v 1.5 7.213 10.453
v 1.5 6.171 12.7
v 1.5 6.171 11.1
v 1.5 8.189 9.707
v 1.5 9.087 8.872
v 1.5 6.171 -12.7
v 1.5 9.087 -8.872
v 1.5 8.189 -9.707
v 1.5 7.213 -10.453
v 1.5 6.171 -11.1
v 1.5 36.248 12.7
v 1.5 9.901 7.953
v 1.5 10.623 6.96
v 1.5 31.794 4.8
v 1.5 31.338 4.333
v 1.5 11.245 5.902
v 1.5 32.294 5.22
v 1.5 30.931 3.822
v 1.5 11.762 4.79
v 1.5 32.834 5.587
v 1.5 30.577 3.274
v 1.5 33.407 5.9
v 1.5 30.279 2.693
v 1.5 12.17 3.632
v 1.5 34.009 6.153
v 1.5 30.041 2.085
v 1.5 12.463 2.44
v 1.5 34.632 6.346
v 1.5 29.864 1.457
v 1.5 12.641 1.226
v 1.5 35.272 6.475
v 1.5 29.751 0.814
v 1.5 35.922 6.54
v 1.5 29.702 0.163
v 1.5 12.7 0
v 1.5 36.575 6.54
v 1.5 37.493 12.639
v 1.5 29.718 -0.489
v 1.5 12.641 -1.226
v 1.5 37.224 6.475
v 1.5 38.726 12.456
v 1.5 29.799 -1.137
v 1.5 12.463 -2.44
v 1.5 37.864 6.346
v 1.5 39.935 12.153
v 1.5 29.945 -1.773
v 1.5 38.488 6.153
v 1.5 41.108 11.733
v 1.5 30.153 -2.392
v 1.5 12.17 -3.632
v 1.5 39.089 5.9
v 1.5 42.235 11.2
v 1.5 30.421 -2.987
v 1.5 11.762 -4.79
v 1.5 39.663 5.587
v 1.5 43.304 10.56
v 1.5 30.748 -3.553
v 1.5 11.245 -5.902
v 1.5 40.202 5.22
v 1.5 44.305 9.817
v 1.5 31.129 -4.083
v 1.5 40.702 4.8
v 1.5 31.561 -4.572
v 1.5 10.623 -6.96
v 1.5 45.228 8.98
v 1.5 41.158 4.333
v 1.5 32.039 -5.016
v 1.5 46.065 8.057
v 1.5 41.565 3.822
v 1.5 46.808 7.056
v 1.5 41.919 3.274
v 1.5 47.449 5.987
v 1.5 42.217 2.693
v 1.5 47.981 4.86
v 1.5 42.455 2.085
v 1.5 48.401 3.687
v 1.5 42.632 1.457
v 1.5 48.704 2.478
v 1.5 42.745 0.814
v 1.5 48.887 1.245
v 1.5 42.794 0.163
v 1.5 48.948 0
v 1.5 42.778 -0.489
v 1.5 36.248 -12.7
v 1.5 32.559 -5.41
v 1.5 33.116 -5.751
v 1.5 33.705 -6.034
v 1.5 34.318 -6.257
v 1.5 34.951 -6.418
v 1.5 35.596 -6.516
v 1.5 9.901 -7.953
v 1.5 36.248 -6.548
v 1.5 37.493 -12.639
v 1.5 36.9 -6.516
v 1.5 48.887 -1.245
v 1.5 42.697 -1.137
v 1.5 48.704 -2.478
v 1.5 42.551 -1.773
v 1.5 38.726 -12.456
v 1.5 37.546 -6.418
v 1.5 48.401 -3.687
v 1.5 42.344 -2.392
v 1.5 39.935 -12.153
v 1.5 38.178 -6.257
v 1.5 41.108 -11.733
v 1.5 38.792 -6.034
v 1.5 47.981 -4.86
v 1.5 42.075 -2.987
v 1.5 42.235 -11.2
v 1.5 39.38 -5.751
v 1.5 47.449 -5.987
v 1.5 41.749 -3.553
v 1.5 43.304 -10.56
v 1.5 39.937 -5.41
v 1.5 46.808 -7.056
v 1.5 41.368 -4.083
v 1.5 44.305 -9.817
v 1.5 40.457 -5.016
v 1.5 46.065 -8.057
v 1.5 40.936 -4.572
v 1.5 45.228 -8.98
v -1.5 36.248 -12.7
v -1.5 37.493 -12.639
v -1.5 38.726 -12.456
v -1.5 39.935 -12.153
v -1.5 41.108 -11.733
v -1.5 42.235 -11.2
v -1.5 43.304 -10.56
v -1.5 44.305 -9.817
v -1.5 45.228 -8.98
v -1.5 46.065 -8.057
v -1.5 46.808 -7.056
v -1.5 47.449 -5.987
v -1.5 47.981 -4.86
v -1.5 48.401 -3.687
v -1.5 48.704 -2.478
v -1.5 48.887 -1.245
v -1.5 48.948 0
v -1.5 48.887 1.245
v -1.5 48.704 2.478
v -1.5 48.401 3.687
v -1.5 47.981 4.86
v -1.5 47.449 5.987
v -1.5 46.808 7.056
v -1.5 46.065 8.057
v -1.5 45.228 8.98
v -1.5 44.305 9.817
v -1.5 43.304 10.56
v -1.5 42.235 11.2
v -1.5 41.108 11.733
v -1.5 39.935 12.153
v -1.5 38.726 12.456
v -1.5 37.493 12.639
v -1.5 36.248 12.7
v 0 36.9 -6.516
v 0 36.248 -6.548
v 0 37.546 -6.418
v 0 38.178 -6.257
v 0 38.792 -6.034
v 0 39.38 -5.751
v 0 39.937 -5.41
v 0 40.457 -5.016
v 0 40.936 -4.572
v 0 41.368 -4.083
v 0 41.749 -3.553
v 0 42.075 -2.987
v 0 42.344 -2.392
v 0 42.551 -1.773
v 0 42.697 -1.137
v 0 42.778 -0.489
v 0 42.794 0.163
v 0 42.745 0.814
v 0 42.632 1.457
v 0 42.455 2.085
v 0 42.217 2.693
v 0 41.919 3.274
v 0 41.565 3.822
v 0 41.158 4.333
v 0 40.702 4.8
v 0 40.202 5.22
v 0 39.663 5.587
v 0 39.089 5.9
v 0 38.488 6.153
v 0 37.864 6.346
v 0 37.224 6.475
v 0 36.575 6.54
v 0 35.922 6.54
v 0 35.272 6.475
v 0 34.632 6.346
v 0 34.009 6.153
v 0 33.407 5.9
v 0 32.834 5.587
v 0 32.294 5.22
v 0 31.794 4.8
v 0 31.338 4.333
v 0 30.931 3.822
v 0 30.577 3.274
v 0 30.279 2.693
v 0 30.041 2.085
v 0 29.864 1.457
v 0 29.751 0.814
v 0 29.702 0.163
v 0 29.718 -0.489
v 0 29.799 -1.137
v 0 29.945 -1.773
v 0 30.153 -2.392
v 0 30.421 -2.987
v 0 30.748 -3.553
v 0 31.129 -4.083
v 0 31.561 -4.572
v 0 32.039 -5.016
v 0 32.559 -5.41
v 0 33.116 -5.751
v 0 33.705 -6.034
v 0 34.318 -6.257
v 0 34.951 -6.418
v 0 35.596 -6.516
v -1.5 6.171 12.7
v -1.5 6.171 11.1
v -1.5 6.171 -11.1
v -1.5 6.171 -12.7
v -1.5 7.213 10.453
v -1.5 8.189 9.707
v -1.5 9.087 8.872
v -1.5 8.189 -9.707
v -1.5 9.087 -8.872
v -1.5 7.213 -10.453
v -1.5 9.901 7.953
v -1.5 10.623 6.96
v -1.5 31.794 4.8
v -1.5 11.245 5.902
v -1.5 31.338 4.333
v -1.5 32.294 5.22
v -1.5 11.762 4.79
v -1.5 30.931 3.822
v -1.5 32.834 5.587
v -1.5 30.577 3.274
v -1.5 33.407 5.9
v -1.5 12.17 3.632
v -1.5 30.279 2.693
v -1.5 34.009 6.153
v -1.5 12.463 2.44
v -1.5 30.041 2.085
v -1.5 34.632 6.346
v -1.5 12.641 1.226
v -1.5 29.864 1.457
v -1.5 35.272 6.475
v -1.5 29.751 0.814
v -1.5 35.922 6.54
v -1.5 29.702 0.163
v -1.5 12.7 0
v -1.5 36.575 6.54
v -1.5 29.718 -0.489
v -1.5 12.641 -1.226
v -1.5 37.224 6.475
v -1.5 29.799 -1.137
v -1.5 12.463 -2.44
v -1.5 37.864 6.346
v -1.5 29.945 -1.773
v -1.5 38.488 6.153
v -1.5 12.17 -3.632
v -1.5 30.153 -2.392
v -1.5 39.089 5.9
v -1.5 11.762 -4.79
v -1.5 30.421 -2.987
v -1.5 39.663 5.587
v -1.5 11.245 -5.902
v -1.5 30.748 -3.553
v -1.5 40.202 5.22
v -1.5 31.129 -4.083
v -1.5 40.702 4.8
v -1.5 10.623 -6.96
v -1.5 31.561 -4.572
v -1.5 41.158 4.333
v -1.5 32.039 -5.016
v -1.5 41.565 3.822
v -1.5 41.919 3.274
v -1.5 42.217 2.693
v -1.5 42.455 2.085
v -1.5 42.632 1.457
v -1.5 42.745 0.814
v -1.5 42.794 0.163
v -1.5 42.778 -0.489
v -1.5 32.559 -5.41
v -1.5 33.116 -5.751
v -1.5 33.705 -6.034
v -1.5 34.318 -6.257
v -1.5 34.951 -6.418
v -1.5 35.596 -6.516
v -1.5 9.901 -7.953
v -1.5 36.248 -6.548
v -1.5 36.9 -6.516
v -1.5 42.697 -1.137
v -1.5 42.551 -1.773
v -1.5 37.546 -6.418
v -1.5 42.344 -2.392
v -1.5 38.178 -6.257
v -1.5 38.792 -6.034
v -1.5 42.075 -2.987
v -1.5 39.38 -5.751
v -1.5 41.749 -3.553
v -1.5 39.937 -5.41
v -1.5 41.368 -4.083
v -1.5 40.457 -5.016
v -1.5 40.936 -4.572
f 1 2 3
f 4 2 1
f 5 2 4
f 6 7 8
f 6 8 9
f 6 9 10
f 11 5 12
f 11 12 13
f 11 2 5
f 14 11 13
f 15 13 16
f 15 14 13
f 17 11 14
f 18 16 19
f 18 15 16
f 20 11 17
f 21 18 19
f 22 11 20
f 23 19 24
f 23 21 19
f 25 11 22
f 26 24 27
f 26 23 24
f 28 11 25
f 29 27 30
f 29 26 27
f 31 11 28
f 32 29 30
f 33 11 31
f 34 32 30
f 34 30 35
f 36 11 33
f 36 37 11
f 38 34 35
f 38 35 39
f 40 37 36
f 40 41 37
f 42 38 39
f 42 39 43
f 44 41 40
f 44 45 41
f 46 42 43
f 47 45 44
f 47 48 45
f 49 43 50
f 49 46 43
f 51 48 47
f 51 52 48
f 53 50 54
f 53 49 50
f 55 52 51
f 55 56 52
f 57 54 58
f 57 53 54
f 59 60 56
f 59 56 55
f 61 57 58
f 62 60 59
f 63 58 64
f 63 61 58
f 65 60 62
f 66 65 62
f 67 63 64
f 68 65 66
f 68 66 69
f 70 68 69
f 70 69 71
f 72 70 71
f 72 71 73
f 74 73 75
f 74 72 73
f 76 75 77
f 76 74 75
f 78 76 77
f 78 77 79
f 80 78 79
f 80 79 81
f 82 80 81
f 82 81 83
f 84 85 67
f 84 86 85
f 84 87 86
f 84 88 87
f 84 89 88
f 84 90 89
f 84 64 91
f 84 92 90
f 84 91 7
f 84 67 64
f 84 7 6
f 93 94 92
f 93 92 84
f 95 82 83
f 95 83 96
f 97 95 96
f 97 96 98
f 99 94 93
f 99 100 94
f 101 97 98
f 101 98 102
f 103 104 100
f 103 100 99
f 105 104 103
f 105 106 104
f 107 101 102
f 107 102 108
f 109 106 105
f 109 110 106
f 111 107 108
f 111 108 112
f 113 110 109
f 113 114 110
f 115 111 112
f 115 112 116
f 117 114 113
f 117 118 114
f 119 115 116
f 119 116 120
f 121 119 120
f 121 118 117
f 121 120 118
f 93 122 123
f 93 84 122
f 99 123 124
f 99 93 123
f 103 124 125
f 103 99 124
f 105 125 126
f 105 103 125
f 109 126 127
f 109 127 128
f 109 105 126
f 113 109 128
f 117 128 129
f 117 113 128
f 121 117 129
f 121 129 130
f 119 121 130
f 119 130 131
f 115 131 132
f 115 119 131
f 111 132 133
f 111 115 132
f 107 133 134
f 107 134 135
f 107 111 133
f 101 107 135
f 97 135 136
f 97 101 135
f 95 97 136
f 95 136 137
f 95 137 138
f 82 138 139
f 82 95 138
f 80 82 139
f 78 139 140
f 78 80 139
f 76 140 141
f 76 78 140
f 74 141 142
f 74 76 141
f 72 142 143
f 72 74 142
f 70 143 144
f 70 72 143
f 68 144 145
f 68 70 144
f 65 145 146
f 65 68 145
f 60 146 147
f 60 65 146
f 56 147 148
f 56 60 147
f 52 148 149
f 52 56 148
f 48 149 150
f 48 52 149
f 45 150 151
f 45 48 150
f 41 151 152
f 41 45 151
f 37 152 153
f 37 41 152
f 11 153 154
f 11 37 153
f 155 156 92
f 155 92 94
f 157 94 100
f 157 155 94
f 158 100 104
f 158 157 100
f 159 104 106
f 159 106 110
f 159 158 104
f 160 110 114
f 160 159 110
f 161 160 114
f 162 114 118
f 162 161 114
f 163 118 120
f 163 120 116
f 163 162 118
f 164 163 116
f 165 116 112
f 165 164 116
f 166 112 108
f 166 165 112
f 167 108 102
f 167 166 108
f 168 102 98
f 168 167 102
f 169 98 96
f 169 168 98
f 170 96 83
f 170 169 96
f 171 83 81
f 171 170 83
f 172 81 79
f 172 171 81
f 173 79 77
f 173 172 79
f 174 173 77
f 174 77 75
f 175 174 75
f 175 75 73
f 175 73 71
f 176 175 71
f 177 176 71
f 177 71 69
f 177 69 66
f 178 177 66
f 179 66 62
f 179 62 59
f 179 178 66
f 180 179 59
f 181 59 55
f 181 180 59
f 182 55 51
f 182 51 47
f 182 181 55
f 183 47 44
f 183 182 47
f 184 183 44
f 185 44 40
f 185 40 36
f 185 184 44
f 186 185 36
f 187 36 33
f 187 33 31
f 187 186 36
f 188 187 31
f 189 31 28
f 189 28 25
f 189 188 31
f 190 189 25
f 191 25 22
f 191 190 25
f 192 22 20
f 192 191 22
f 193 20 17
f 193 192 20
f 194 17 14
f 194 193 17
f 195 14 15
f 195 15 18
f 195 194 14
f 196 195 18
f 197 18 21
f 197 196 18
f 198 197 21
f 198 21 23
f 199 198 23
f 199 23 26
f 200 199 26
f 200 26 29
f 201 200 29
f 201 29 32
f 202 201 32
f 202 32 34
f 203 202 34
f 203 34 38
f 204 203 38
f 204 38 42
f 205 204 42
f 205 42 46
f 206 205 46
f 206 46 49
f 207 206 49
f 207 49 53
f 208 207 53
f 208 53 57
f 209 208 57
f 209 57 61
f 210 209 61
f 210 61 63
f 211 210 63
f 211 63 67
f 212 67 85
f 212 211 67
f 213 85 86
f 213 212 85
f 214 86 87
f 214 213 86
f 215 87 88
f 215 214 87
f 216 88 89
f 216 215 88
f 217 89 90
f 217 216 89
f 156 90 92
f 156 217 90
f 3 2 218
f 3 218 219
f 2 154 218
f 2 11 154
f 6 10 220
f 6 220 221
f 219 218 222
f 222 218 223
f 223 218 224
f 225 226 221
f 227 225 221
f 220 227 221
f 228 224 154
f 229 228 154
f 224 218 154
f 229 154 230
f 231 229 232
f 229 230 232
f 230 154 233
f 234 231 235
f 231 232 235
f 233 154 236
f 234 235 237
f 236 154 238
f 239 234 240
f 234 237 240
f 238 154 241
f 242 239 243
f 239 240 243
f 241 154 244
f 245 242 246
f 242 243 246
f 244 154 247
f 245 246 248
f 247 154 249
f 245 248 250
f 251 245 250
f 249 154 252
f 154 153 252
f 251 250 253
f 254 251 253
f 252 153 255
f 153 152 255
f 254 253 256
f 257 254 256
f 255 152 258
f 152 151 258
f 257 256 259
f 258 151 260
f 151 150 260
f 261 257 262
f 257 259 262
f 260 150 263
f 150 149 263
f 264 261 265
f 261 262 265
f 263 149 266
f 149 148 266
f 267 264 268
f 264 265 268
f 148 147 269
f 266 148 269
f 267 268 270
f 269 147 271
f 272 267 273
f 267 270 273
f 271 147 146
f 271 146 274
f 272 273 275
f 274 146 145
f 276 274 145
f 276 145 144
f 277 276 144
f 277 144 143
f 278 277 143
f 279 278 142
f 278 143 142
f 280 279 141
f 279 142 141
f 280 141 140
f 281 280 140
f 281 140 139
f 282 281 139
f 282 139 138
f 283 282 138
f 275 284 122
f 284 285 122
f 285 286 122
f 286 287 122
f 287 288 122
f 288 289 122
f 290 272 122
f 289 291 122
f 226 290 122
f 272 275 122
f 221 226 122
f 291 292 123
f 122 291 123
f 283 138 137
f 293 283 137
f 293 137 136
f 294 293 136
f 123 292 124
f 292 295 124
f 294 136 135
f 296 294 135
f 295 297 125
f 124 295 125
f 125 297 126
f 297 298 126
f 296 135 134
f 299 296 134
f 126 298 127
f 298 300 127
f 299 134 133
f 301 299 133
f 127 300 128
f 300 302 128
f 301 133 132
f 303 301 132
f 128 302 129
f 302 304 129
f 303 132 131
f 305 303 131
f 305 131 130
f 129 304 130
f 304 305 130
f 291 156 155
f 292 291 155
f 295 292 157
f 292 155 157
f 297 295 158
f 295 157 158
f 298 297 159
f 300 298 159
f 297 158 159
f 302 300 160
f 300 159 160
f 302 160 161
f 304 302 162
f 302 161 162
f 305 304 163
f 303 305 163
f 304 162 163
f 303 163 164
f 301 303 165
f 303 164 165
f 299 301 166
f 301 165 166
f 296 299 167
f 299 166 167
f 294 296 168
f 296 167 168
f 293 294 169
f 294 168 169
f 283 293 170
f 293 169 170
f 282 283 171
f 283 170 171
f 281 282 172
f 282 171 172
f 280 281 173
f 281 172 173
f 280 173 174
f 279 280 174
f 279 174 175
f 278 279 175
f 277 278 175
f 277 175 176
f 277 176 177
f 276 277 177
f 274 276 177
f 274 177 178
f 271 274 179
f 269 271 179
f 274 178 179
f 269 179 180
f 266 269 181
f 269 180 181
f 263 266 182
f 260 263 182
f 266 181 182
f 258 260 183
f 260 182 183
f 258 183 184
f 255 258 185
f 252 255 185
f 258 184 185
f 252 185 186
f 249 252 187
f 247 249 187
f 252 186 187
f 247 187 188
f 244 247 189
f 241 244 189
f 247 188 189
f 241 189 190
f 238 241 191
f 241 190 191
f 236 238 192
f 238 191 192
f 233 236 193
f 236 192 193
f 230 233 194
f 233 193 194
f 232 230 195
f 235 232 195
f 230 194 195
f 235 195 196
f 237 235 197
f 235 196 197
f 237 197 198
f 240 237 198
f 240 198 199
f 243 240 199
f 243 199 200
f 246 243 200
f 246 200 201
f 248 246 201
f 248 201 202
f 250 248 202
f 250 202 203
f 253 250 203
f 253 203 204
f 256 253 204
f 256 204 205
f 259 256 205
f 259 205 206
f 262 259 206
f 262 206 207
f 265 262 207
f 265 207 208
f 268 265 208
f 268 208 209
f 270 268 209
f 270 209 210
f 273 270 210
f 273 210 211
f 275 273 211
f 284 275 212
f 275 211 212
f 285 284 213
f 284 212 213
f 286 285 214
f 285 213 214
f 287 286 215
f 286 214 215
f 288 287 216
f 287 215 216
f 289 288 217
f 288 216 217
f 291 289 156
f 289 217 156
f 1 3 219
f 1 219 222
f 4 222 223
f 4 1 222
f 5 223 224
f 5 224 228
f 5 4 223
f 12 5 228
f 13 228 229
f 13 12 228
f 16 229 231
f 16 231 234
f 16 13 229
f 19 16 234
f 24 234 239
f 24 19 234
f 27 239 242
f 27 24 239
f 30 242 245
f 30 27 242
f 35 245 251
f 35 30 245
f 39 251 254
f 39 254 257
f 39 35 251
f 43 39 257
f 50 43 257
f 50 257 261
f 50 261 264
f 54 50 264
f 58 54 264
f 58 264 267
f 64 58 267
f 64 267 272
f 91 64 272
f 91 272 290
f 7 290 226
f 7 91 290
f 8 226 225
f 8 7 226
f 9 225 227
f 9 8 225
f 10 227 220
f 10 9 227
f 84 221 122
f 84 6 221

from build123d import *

# Parameters (mm, degrees)
BOSS_EXTRUDE1_DEPTH      = 1.5
BOSS_EXTRUDE1_DEPTH_BACK = 1.5
SKETCH1_R                = 6.54812


with BuildPart() as part:
    # Sketch1 → Boss-Extrude1 (new, two sides: drawn at the far end of the back side and taken through both)
    with BuildSketch(Plane(origin=(0, 0, 0), x_dir=(0, 0, -1), z_dir=(1, 0, 0)).offset(-BOSS_EXTRUDE1_DEPTH_BACK)):
        with BuildLine():
            Line((-12.7, 36.24812), (-12.7, 6.170899448))
            Line((-12.7, 6.170899448), (-11.1, 6.170899448))
            ThreePointArc((-11.1, 6.170899448), (0, 12.7), (11.1, 6.170899448))
            Line((11.1, 6.170899448), (12.7, 6.170899448))
            Line((12.7, 6.170899448), (12.7, 36.24812))
            ThreePointArc((12.7, 36.24812), (0, 48.94812), (-12.7, 36.24812))
        make_face()
        with Locations((0, 36.24812)):
            Circle(SKETCH1_R, mode=Mode.SUBTRACT)
    extrude(amount=BOSS_EXTRUDE1_DEPTH + BOSS_EXTRUDE1_DEPTH_BACK)


solid = part.part
